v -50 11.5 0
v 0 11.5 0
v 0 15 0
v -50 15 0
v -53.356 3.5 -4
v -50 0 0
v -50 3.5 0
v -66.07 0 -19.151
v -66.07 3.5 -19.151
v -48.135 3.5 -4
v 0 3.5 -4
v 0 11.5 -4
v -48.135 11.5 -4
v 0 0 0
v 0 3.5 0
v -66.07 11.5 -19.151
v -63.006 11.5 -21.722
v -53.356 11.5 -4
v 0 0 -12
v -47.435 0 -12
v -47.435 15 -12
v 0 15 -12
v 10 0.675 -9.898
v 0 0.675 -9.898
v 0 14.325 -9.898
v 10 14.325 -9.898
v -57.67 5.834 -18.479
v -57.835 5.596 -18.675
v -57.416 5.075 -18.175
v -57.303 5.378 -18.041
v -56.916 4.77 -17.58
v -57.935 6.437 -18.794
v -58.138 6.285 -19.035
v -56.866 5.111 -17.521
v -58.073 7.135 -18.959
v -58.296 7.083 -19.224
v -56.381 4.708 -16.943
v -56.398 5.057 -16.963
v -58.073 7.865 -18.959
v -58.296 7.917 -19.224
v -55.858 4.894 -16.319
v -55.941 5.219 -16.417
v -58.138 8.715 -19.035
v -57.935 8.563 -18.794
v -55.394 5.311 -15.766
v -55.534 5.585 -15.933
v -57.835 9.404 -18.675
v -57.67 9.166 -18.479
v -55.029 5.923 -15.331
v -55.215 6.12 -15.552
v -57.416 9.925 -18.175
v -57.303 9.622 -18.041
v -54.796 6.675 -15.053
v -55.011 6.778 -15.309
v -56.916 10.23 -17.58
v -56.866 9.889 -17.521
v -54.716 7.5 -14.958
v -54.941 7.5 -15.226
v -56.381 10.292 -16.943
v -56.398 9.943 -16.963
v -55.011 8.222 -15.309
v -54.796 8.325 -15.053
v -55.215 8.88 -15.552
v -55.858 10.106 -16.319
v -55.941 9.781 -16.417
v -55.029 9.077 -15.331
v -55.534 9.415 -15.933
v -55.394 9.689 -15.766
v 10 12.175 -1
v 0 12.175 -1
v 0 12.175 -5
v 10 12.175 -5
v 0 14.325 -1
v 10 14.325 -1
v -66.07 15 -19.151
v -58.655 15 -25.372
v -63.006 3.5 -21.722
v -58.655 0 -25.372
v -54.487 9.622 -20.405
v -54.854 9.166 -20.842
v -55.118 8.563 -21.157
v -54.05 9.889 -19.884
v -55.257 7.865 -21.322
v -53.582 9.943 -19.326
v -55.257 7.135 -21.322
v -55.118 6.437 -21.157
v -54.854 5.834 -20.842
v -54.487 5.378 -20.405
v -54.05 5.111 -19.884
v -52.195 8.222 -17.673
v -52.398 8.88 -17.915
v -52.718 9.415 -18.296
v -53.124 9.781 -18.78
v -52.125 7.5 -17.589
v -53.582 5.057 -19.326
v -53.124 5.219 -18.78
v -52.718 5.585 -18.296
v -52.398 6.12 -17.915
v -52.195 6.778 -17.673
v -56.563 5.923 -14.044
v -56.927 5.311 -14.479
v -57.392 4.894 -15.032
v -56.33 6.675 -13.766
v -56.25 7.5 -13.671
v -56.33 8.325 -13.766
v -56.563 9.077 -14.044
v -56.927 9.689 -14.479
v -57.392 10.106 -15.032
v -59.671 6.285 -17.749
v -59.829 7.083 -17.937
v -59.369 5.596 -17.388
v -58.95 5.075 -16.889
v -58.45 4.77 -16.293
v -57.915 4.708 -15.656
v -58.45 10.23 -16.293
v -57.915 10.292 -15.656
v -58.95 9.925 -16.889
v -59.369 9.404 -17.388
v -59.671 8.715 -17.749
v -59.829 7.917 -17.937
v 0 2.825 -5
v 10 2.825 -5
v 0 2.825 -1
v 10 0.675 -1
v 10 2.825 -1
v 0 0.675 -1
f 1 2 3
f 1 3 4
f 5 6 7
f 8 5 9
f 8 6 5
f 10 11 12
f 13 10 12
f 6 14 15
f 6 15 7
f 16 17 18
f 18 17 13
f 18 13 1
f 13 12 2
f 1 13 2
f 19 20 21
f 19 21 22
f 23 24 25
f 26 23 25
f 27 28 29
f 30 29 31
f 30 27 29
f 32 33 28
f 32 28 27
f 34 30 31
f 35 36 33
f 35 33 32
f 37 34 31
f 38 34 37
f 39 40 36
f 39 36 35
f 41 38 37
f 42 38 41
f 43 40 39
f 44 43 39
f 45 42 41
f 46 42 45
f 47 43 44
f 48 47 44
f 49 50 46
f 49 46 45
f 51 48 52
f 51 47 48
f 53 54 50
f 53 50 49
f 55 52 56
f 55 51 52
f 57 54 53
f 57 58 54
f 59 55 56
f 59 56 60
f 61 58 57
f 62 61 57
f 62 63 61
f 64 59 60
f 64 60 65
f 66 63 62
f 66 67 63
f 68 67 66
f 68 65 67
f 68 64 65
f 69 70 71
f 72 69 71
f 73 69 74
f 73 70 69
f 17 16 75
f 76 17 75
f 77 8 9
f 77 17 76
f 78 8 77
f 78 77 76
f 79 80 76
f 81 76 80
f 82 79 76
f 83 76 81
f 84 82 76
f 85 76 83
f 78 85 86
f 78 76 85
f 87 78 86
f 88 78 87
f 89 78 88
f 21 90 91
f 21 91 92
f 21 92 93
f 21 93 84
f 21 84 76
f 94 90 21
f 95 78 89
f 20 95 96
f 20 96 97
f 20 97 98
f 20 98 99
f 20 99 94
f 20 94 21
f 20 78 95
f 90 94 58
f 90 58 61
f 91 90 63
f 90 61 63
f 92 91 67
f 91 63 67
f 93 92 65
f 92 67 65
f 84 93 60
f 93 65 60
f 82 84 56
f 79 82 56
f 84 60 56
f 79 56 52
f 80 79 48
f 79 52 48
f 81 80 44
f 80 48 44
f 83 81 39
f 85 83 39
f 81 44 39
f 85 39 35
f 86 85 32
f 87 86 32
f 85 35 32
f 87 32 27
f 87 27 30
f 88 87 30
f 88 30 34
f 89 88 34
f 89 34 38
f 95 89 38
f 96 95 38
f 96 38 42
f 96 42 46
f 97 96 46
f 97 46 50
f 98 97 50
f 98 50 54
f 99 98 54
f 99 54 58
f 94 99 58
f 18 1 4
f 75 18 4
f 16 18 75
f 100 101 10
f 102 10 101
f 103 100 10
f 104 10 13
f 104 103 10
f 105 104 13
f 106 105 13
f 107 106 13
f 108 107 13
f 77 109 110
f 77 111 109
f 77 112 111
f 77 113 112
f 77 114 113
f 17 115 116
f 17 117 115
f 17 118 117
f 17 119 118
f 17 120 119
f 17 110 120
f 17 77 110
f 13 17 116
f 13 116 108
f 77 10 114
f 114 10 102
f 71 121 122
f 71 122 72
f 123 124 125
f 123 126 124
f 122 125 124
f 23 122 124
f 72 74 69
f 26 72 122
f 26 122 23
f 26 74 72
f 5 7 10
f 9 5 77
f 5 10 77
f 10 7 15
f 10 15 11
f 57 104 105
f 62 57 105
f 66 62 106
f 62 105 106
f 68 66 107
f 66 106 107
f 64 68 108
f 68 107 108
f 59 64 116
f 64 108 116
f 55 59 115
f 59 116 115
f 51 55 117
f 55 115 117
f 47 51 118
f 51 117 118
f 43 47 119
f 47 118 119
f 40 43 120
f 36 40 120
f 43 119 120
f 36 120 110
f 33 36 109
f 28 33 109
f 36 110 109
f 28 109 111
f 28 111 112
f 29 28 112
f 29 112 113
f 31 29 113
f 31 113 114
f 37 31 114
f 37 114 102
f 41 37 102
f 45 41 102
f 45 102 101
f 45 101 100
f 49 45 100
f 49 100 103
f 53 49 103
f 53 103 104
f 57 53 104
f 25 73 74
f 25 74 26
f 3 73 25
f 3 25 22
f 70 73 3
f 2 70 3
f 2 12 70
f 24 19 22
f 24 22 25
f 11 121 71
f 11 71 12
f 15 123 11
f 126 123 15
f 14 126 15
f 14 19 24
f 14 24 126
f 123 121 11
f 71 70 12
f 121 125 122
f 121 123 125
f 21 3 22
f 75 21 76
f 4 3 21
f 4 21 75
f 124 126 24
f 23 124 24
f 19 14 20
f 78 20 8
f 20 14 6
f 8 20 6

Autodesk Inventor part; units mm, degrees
ref_plane "YZ Plane" through (0, 0, 0) normal (1, 0, 0) x (0, 1, 0)
ref_plane "XZ Plane" through (0, 0, 0) normal (0, 1, 0) x (-1, 0, 0)
ref_plane "XY Plane" through (0, 0, 0) normal (0, 0, 1) x (1, 0, 0)
sketch "Náčrt1" plane through (0, 0, 0) normal (0, 1, 0) x (-1, 0, 0)
  line L0 (0, 0) -> (50, 0)
  line L1 (50, 0) -> (66.0697, -19.1511)
  line L2 (50, 0) -> (75, 0) construction
  line L3 (66.0697, -19.1511) -> (58.4092, -25.579)
  line L4 (0, -12) -> (0, 0)
  line L5 (58.6554, -25.3724) -> (47.4347, -12)
  line L6 (47.4347, -12) -> (0, -12)
  dimension "d0" = 50
  dimension "d2" = 25
  dimension "d3" = 50
  dimension "d4" = 10
  dimension "d5" = 12
extrude "Vysunutí1" add sketch "Náčrt1" along normal blind 15
sketch "Náčrt8" plane through (-66.0697, 0, -19.1511) normal (-0.6428, 0, -0.766) x (-0.766, 0, 0.6428)
  line L0 (-9.6786, 0) -> (-9.6786, 15) projected
  line L1 (-9.6786, 7.5) -> (0, 7.5)
  line L2 (0, 0) -> (0, 15) projected
  point P0 (-38.3022, 0)
sketch "Náčrt9" plane through (-50, 0, 0) normal (-0.766, 0, 0.6428) x (0.6428, 0, 0.766)
  line L0 (-25, 0) -> (-25, 15) projected
  line L1 (0, 0) -> (0, 15) projected
sketch "Náčrt10" plane through (-50, 0, 0) normal (0, 0, 1) x (1, 0, 0)
  line L0 (0, 0) -> (0, 15) projected
  line L1 (0, 7.5) -> (50, 7.5)
  line L2 (50, 0) -> (50, 15) projected
sketch "Náčrt11" plane through (0, 0, 0) normal (1, 0, 0) x (0, 0, -1)
  line L0 (0, 0) -> (0, 15) projected
  line L1 (0, 7.5) -> (12, 7.5)
  line L2 (12, 0) -> (12, 15) projected
  line L3 (0, 3.5) -> (4, 3.5)
  line L4 (4, 3.5) -> (4, 11.5)
  line L5 (4, 11.5) -> (0, 11.5)
  line L6 (0, 11.5) -> (0, 3.5)
  point P0 (0, 7.5)
  point P1 (0, 11.5)
  dimension "d64" = 4
  dimension "d65" = 8
extrude "Vysunutí10" cut sketch "Náčrt11" against normal through all
sketch "Náčrt21" plane through (-66.0697, 0, -19.1511) normal (-0.6428, 0, -0.766) x (-0.766, 0, 0.6428)
  line L0 (0, 0) -> (0, 15) projected
  line L1 (0, 3.5) -> (-4, 3.5)
  line L2 (-4, 3.5) -> (-4, 11.5)
  line L3 (-4, 11.5) -> (0, 11.5)
  line L4 (0, 11.5) -> (0, 3.5)
  point P0 (-38.3022, 0)
  point P1 (0, 7.5)
  point P2 (0, 11.5)
  dimension "d68" = 4
  dimension "d69" = 8
extrude "Vysunutí11" cut sketch "Náčrt21" against normal through all
sketch "Náčrt22" plane through (-63.0055, 3.5, -21.7223) normal (-0.766, 0, 0.6428) x (0.6428, 0, 0.766)
  line L0 (0, -3.5) -> (0, 11.5) projected
  line L1 (0, 4) -> (23.1348, 4)
  line L2 (23.1348, 8) -> (23.1348, 0) projected
  circle A0 centre (7.71, 4) radius 2.8
  point P0 (57.1394, -3.5)
  dimension "d72" = 5.6
sketch "Náčrt25" plane through (-58.6554, 0, -25.3724) normal (-0.6428, 0, -0.766) x (-0.766, 0, 0.6428)
  line L0 (5.6786, 3.5) -> (5.6786, 11.5) projected
  line L1 (5.6786, 5.4735) -> (0, 5.4735)
  line L2 (0, 0) -> (0, 15) projected
  point P0 (-28.6236, 0)
  dimension "d73" = 5.6786
extrude "Vysunutí12" cut sketch "Náčrt22" against normal blind 2
sketch "Náčrt27" plane through (-56.5175, 7.5, -17.1016) normal (-0.766, 0, 0.6428) x (0.6428, 0, 0.766)
  circle A0 centre (0, 0) radius 2.8 projected
  line L0 (0, -2.8) -> (0, 2.8)
  line L1 (-2.7895, 0) -> (2.8105, 0)
  circle A1 centre (0, 0) radius 2.45
  point P0 (49.4294, -7.5)
  dimension "d79" = 5.6
  dimension "d80" = 4.9
extrude "Vysunutí14" cut sketch "Náčrt27" against normal through all contours A1 L0 L1 | L1 L0 A1 | L0 L1 A1 | A1 L1 L0
sketch "Náčrt28" plane through (0, 0, 0) normal (1, 0, 0) x (0, 0, -1)
  line L0 (0, 0) -> (0, 3.5) projected
  line L1 (12, 0) -> (12, 15) projected
  line L2 (0, 0) -> (12, 0) projected
  line L3 (0, 15) -> (12, 15) projected
  line L4 (0, 11.5) -> (0, 15) projected
  line L5 (1, 0.6751) -> (10, 0.6751)
  line L6 (4, 11.5) -> (4, 3.5) projected
  line L7 (1, 2.8249) -> (5, 2.8249)
  line L8 (1, 12.1751) -> (5, 12.1751)
  line L9 (1, 14.3249) -> (10, 14.3249)
  line L10 (5, 2.8249) -> (5, 12.1751)
  line L11 (9.8978, 0.6751) -> (9.8978, 14.3249)
  line L12 (1, 0.6751) -> (1, 2.8249)
  line L13 (1, 12.1751) -> (1, 14.3249)
  line L14 (4, 7.5) -> (12, 7.5)
  point P0 (5, 7.5)
  point P1 (9.8978, 7.5)
  point P2 (5.5, 0.6751)
  point P3 (5.5, 14.3249)
  point P4 (1, 13.25)
  point P5 (0, 13.25)
  point P6 (1, 1.75)
  point P7 (0, 1.75)
extrude "Vysunutí15" add sketch "Náčrt28" along normal blind 10
properties part number "LAMPA1"
